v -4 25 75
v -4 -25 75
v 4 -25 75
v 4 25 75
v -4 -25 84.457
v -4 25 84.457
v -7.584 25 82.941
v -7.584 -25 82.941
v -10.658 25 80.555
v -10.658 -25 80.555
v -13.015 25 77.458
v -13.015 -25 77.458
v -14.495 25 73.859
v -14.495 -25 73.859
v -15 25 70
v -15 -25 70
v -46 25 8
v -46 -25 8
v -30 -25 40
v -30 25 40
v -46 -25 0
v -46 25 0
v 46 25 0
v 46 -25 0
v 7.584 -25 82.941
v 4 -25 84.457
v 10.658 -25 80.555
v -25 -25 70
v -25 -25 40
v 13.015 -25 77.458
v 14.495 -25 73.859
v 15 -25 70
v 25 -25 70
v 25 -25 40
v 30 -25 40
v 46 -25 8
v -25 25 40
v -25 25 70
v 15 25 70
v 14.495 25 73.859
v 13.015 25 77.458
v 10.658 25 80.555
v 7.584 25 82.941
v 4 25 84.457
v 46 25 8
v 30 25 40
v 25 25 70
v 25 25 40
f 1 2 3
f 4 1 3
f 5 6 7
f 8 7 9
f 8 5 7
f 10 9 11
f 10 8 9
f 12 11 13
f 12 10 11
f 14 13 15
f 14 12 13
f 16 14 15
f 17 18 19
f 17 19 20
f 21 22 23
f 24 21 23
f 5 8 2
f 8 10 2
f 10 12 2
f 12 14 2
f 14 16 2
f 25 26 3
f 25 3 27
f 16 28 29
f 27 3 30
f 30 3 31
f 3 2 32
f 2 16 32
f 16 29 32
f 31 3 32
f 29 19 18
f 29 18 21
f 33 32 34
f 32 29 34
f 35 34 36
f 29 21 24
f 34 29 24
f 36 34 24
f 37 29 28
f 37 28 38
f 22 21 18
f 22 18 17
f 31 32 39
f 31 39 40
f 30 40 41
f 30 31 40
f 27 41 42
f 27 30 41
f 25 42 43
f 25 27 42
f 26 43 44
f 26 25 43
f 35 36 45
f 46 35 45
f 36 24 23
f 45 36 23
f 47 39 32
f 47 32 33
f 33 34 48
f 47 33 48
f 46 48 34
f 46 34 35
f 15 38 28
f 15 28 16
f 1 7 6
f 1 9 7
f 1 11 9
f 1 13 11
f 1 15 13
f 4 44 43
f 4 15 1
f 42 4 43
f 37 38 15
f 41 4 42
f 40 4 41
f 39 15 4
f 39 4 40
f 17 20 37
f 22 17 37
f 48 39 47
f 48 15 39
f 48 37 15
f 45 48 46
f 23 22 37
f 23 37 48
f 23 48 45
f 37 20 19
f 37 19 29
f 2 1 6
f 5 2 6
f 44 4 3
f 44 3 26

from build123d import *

# Parameters (mm, degrees)
F0_W      = 92
F0_H      = 50
F1_DEPTH  = 40
F2_SIZE2  = 32
F2_SIZE   = 16
F3_SIZE2  = 32
F3_SIZE   = 16
F5_W      = 50
F5_H      = 50
F6_DEPTH  = 30
F8_DEPTH  = 50
F9_W      = 8
F9_H      = 20
F10_DEPTH = 50.001


with BuildPart() as f1:
    # F0 (on Top) → F1 (new body)
    with BuildSketch(Plane.XY):
        Rectangle(F0_W, F0_H)
    extrude(amount=F1_DEPTH)

    # F2
    f2_edges = [f1.edges().sort_by_distance(p)[0] for p in [
        (46, 0, 40),
    ]]
    f2_side = f1.faces().sort_by_distance((0, 0, 40))[0]
    chamfer(f2_edges, length=F2_SIZE, length2=F2_SIZE2, reference=f2_side)

    # F3
    f3_edges = [f1.edges().sort_by_distance(p)[0] for p in [
        (-46, 0, 40),
    ]]
    f3_side = f1.faces().sort_by_distance((-8, 0, 40))[0]
    chamfer(f3_edges, length=F3_SIZE, length2=F3_SIZE2, reference=f3_side)

    # F5 (on face) → F6 (join)
    with BuildSketch(Plane.XY.offset(40)):
        Rectangle(F5_W, F5_H)
    extrude(amount=F6_DEPTH)

    # F7 (on face) → F8 (join)
    with BuildSketch(Plane.XZ.offset(25)):
        with BuildLine():
            Line((-15, 70), (15, 70))
            ThreePointArc((15, 70), (0, 85), (-15, 70))
        make_face()
    extrude(amount=-F8_DEPTH)

    # F9 (on face) → F10 (cut, through all)
    with BuildSketch(Plane.XZ.offset(25)):
        with Locations((0, 85)):
            Rectangle(F9_W, F9_H)
    extrude(amount=-F10_DEPTH, mode=Mode.SUBTRACT)


solid = f1.part
